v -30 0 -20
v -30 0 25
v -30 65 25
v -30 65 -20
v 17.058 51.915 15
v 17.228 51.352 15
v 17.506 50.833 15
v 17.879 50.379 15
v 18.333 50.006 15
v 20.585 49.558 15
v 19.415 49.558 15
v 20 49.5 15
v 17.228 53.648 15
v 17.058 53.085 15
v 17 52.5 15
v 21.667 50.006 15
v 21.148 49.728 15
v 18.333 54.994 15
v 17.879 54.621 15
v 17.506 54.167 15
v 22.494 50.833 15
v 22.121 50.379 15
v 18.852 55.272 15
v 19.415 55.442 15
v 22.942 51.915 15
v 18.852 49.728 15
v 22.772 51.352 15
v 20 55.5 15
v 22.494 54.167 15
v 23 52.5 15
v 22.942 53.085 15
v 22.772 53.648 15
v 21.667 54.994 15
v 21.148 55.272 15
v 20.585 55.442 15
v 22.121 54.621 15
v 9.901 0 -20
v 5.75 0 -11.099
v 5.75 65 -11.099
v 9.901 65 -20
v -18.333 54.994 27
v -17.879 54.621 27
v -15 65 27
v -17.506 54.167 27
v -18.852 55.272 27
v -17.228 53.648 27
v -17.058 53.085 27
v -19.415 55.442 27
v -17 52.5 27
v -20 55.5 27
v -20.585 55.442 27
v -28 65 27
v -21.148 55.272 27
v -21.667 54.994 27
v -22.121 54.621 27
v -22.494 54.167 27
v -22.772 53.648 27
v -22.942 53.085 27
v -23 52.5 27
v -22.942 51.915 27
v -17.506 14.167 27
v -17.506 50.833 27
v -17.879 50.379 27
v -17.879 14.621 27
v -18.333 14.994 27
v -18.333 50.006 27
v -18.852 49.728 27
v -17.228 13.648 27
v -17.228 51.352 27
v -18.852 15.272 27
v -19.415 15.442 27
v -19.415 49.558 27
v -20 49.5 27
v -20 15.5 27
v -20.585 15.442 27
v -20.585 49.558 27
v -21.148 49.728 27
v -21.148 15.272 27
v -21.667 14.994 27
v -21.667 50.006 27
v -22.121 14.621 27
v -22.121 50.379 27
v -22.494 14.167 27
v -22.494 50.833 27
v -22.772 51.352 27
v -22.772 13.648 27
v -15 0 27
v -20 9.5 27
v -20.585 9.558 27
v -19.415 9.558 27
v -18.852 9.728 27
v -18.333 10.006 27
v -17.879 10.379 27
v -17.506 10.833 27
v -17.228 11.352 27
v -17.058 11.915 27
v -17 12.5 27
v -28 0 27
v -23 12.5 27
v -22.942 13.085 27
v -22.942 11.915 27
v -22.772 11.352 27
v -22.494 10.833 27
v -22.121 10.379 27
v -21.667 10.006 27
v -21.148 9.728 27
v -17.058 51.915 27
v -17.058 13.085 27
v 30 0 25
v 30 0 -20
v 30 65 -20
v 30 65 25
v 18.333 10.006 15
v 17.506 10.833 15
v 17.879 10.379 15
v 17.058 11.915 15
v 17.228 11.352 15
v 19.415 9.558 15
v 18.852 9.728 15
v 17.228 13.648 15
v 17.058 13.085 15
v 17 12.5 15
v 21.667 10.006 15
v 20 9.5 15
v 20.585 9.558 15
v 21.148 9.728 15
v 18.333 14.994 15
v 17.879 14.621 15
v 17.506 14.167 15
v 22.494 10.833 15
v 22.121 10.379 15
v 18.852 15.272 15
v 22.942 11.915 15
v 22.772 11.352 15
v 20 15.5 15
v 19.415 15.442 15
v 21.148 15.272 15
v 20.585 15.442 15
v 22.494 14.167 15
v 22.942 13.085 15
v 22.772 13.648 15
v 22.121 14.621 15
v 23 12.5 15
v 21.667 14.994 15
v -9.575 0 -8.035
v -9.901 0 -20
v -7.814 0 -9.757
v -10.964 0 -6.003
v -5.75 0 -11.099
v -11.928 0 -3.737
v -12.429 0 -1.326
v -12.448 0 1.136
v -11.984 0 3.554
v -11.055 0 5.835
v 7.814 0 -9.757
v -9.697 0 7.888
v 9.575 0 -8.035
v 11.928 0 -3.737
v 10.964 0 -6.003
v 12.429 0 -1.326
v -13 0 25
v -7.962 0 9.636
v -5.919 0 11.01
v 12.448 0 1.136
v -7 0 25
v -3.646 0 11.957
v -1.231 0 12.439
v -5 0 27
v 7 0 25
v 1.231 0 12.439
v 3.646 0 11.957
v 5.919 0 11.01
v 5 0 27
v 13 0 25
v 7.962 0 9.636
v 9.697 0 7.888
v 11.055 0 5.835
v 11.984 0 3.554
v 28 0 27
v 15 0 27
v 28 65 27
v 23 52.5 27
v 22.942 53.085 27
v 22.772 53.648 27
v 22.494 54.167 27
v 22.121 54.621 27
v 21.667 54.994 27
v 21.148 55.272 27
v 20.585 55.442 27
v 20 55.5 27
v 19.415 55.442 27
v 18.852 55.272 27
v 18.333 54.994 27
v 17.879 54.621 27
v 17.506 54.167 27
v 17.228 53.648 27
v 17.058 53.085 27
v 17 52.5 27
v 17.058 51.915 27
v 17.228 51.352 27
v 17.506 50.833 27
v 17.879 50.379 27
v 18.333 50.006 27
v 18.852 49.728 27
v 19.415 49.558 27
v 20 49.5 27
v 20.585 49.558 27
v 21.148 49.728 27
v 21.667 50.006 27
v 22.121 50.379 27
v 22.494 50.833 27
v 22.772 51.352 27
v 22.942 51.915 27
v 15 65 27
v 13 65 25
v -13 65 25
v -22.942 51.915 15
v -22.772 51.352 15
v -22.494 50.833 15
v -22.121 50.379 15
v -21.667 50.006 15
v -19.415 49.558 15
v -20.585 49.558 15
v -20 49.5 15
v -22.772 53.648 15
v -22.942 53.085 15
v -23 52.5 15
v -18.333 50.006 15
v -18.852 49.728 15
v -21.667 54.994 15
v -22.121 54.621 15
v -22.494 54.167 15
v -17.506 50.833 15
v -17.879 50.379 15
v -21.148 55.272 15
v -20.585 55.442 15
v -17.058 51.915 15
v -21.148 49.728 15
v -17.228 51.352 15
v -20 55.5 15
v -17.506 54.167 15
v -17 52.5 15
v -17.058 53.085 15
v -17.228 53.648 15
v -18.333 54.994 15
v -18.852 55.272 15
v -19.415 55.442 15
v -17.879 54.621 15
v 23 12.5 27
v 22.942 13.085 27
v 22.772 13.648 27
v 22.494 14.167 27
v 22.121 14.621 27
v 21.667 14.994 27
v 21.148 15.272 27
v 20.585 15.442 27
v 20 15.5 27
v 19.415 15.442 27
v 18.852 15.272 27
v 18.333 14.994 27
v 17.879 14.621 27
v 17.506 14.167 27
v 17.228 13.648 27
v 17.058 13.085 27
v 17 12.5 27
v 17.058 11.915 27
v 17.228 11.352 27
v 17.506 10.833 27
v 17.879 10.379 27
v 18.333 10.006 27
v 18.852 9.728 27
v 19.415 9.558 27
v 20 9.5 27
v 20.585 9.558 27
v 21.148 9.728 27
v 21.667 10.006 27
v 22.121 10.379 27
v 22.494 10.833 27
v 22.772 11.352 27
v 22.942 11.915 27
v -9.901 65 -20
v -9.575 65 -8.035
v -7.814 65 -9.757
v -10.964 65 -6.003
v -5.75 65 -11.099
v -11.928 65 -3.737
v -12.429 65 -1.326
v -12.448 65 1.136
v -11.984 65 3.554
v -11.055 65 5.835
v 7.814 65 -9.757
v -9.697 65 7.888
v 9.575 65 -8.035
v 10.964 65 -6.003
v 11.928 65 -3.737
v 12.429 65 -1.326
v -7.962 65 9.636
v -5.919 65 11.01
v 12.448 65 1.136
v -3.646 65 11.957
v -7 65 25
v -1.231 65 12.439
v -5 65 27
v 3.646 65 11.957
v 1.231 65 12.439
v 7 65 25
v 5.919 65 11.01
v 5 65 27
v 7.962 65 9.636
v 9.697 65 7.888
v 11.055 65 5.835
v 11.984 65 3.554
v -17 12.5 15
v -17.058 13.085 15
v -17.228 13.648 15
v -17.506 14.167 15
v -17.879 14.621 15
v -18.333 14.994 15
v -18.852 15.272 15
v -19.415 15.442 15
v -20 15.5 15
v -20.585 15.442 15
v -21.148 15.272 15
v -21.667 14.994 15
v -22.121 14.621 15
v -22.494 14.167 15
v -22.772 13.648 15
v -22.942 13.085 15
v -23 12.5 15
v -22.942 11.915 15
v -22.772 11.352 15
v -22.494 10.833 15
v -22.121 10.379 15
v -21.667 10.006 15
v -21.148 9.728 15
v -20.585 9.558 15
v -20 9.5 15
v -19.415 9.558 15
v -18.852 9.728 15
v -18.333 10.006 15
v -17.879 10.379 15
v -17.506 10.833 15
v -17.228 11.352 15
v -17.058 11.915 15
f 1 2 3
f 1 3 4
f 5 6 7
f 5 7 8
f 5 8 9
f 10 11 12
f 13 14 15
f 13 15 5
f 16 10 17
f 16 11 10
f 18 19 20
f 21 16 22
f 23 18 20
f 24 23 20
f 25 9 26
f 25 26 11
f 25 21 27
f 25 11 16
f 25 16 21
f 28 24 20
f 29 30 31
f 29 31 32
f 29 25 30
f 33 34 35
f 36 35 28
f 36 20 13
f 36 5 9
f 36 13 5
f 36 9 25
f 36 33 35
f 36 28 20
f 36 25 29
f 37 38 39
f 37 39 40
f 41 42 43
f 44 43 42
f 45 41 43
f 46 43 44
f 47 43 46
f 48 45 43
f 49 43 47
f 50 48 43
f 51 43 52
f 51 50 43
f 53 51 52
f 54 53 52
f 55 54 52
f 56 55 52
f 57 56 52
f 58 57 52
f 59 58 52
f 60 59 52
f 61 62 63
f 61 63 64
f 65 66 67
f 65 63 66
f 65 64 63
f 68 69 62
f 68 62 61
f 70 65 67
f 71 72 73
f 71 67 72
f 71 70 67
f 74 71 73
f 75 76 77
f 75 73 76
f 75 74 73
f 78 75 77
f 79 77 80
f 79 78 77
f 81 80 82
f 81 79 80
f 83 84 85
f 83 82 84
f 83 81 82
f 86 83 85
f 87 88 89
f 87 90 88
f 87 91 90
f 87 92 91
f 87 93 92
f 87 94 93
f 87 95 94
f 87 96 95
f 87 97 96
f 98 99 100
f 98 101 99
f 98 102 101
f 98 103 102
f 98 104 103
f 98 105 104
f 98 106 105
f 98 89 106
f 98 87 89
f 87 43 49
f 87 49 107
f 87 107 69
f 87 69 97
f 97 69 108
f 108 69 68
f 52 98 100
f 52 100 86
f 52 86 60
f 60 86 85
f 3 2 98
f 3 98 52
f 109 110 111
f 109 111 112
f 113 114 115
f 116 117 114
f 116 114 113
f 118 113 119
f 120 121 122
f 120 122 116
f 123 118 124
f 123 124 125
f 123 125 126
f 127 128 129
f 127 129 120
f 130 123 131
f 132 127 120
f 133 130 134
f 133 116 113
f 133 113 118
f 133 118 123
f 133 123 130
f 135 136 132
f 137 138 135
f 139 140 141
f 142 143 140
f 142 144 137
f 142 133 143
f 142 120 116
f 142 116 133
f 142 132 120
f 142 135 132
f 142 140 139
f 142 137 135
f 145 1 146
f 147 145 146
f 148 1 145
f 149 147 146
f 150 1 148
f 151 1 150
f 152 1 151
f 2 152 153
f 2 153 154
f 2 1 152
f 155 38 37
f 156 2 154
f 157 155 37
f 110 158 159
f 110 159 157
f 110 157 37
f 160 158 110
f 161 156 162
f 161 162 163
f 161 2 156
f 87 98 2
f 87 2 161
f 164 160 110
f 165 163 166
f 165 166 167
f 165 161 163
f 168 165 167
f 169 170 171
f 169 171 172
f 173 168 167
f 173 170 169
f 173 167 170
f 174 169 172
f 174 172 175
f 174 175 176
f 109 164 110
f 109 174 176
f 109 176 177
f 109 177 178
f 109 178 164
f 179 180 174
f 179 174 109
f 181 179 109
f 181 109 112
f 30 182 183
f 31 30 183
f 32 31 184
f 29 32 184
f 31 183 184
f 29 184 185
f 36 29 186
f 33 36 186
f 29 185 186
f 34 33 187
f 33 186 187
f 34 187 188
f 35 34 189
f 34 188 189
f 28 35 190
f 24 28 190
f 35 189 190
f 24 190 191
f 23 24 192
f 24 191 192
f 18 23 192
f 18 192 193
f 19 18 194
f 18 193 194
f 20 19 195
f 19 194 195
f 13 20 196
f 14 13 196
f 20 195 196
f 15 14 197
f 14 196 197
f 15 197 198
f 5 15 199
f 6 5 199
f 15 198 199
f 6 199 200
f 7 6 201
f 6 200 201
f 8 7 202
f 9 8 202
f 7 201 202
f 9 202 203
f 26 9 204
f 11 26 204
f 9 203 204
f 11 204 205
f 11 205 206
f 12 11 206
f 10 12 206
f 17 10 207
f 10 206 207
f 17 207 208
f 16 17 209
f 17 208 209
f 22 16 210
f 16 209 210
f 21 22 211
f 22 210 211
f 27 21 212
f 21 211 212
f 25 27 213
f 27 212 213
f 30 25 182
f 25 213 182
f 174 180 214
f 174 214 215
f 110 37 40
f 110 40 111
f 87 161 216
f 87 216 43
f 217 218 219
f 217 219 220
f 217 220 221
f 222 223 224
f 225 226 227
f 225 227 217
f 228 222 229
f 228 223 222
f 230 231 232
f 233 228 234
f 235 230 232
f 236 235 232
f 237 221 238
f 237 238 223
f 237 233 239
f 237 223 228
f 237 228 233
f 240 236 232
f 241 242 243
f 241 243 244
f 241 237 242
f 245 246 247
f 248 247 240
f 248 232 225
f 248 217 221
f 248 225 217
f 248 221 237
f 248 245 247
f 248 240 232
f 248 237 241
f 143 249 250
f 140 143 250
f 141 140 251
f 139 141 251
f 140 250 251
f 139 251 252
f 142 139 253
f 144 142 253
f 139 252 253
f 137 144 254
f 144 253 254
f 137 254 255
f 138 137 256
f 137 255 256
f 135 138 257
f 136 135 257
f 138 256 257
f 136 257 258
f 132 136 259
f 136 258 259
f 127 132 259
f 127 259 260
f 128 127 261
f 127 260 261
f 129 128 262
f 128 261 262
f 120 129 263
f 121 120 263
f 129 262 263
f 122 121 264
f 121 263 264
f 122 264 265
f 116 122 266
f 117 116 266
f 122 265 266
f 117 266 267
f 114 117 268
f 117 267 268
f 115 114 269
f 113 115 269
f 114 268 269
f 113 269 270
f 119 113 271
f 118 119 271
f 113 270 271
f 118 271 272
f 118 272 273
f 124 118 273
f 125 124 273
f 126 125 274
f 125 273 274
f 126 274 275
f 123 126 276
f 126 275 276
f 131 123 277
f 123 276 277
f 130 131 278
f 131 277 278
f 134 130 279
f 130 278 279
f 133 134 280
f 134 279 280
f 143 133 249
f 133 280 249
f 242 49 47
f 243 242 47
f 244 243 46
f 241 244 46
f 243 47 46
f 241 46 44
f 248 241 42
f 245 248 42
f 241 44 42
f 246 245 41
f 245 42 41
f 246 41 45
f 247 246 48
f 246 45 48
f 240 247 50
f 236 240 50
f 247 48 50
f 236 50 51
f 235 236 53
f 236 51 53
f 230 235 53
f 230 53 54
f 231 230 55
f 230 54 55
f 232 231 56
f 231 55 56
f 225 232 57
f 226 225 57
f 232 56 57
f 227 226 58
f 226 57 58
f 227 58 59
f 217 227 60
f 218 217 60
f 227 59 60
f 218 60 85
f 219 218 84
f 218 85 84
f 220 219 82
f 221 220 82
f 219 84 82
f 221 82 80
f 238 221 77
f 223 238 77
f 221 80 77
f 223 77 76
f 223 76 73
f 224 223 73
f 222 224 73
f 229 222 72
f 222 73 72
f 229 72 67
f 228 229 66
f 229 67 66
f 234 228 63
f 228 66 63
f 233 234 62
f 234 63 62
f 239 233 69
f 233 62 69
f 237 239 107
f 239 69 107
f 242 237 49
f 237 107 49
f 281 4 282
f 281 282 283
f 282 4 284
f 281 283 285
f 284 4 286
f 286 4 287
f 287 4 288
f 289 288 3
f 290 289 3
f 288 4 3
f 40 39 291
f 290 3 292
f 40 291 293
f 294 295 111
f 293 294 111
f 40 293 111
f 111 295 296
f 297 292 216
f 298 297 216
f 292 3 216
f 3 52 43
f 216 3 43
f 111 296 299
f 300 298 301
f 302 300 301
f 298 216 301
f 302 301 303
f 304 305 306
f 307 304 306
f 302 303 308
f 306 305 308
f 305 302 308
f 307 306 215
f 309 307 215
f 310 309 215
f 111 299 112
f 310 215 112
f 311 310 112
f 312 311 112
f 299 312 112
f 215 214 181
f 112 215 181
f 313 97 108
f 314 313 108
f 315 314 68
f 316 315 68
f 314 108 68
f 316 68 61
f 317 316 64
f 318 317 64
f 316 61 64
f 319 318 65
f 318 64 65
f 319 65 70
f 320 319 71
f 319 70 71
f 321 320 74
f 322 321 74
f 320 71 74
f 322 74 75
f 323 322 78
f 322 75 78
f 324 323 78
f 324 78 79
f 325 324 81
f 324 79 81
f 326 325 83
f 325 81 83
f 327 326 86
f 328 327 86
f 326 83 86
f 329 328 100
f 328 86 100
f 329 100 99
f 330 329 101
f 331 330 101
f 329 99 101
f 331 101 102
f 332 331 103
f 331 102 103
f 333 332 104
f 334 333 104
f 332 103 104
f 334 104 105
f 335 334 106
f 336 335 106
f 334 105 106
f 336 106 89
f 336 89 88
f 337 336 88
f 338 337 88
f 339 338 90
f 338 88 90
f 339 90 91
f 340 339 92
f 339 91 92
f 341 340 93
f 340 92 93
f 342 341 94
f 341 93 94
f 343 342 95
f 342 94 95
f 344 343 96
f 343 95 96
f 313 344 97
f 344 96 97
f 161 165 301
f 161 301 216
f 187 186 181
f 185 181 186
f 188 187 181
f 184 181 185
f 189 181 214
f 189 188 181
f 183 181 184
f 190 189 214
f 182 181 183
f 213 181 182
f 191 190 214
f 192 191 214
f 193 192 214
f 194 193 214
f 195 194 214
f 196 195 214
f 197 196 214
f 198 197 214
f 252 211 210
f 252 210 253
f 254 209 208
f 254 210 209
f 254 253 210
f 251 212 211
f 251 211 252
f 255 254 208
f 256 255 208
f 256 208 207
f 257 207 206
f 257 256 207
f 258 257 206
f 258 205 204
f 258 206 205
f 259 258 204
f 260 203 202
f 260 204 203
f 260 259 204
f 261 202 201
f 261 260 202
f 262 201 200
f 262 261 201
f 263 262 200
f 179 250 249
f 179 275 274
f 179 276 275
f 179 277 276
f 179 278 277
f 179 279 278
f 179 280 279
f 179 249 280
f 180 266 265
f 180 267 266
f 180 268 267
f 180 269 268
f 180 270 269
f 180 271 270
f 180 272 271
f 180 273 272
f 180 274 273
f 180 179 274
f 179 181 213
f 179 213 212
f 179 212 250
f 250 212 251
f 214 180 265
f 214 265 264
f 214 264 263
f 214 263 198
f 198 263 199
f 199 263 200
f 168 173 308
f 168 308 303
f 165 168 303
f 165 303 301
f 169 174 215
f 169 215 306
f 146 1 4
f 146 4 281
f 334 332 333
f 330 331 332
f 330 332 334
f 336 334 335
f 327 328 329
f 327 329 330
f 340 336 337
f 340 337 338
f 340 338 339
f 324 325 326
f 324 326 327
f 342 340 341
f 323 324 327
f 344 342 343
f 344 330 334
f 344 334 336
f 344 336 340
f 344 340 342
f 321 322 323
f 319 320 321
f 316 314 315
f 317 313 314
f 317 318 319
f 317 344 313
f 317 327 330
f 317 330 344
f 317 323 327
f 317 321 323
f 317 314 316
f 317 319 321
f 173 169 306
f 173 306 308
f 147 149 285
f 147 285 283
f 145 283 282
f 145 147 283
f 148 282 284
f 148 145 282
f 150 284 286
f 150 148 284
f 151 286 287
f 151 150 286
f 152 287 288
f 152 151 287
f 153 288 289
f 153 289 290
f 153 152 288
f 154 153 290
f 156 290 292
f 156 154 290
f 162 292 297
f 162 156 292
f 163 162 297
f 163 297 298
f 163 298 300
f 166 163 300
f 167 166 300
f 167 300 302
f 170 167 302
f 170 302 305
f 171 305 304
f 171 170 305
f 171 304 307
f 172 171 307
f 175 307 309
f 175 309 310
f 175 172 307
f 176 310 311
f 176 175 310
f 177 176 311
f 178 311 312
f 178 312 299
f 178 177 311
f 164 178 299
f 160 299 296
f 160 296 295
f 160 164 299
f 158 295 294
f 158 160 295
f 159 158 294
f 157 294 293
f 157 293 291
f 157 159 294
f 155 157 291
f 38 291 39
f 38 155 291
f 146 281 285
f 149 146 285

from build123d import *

# Parameters (mm, degrees)
F1_DEPTH = 65
F3_SIZE  = 2
F2_R     = 3
F4_DEPTH = 12


with BuildPart() as f1:
    # F0 (on Front) → F1 (new body)
    with BuildSketch(Plane.XZ):
        with BuildLine():
            ThreePointArc((-5.75, -11.098986), (0, 12.5), (5.75, -11.098986))
            Line((5.75, -11.098986), (9.900611, -20))
            Line((9.900611, -20), (30, -20))
            Line((30, -20), (30, -11.098986))
            Line((30, -11.098986), (30, 27))
            Line((30, 27), (15, 27))
            Line((15, 27), (13, 25))
            Line((13, 25), (7, 25))
            Line((7, 25), (5, 27))
            Line((5, 27), (0, 27))
            Line((0, 27), (-5, 27))
            Line((-5, 27), (-7, 25))
            Line((-7, 25), (-13, 25))
            Line((-13, 25), (-15, 27))
            Line((-15, 27), (-30, 27))
            Line((-30, 27), (-30, -11.098986))
            Line((-30, -11.098986), (-30, -20))
            Line((-30, -20), (-9.900611, -20))
            Line((-9.900611, -20), (-5.75, -11.098986))
        make_face()
    extrude(amount=-F1_DEPTH)

    # F3
    f3_edges = [f1.edges().sort_by_distance(p)[0] for p in [
        (30, 32.5, 27),
        (-30, 32.5, 27),
    ]]
    chamfer(f3_edges, length=F3_SIZE)

    # F2 (on face) → F4 (cut)
    with BuildSketch(Plane.XY.offset(27)):
        with Locations((-20, 52.5)):
            Circle(F2_R)
        with Locations((-20, 12.5)):
            Circle(F2_R)
        with Locations((20, 52.5)):
            Circle(F2_R)
        with Locations((20, 12.5)):
            Circle(F2_R)
    extrude(amount=-F4_DEPTH, mode=Mode.SUBTRACT)


solid = f1.part
